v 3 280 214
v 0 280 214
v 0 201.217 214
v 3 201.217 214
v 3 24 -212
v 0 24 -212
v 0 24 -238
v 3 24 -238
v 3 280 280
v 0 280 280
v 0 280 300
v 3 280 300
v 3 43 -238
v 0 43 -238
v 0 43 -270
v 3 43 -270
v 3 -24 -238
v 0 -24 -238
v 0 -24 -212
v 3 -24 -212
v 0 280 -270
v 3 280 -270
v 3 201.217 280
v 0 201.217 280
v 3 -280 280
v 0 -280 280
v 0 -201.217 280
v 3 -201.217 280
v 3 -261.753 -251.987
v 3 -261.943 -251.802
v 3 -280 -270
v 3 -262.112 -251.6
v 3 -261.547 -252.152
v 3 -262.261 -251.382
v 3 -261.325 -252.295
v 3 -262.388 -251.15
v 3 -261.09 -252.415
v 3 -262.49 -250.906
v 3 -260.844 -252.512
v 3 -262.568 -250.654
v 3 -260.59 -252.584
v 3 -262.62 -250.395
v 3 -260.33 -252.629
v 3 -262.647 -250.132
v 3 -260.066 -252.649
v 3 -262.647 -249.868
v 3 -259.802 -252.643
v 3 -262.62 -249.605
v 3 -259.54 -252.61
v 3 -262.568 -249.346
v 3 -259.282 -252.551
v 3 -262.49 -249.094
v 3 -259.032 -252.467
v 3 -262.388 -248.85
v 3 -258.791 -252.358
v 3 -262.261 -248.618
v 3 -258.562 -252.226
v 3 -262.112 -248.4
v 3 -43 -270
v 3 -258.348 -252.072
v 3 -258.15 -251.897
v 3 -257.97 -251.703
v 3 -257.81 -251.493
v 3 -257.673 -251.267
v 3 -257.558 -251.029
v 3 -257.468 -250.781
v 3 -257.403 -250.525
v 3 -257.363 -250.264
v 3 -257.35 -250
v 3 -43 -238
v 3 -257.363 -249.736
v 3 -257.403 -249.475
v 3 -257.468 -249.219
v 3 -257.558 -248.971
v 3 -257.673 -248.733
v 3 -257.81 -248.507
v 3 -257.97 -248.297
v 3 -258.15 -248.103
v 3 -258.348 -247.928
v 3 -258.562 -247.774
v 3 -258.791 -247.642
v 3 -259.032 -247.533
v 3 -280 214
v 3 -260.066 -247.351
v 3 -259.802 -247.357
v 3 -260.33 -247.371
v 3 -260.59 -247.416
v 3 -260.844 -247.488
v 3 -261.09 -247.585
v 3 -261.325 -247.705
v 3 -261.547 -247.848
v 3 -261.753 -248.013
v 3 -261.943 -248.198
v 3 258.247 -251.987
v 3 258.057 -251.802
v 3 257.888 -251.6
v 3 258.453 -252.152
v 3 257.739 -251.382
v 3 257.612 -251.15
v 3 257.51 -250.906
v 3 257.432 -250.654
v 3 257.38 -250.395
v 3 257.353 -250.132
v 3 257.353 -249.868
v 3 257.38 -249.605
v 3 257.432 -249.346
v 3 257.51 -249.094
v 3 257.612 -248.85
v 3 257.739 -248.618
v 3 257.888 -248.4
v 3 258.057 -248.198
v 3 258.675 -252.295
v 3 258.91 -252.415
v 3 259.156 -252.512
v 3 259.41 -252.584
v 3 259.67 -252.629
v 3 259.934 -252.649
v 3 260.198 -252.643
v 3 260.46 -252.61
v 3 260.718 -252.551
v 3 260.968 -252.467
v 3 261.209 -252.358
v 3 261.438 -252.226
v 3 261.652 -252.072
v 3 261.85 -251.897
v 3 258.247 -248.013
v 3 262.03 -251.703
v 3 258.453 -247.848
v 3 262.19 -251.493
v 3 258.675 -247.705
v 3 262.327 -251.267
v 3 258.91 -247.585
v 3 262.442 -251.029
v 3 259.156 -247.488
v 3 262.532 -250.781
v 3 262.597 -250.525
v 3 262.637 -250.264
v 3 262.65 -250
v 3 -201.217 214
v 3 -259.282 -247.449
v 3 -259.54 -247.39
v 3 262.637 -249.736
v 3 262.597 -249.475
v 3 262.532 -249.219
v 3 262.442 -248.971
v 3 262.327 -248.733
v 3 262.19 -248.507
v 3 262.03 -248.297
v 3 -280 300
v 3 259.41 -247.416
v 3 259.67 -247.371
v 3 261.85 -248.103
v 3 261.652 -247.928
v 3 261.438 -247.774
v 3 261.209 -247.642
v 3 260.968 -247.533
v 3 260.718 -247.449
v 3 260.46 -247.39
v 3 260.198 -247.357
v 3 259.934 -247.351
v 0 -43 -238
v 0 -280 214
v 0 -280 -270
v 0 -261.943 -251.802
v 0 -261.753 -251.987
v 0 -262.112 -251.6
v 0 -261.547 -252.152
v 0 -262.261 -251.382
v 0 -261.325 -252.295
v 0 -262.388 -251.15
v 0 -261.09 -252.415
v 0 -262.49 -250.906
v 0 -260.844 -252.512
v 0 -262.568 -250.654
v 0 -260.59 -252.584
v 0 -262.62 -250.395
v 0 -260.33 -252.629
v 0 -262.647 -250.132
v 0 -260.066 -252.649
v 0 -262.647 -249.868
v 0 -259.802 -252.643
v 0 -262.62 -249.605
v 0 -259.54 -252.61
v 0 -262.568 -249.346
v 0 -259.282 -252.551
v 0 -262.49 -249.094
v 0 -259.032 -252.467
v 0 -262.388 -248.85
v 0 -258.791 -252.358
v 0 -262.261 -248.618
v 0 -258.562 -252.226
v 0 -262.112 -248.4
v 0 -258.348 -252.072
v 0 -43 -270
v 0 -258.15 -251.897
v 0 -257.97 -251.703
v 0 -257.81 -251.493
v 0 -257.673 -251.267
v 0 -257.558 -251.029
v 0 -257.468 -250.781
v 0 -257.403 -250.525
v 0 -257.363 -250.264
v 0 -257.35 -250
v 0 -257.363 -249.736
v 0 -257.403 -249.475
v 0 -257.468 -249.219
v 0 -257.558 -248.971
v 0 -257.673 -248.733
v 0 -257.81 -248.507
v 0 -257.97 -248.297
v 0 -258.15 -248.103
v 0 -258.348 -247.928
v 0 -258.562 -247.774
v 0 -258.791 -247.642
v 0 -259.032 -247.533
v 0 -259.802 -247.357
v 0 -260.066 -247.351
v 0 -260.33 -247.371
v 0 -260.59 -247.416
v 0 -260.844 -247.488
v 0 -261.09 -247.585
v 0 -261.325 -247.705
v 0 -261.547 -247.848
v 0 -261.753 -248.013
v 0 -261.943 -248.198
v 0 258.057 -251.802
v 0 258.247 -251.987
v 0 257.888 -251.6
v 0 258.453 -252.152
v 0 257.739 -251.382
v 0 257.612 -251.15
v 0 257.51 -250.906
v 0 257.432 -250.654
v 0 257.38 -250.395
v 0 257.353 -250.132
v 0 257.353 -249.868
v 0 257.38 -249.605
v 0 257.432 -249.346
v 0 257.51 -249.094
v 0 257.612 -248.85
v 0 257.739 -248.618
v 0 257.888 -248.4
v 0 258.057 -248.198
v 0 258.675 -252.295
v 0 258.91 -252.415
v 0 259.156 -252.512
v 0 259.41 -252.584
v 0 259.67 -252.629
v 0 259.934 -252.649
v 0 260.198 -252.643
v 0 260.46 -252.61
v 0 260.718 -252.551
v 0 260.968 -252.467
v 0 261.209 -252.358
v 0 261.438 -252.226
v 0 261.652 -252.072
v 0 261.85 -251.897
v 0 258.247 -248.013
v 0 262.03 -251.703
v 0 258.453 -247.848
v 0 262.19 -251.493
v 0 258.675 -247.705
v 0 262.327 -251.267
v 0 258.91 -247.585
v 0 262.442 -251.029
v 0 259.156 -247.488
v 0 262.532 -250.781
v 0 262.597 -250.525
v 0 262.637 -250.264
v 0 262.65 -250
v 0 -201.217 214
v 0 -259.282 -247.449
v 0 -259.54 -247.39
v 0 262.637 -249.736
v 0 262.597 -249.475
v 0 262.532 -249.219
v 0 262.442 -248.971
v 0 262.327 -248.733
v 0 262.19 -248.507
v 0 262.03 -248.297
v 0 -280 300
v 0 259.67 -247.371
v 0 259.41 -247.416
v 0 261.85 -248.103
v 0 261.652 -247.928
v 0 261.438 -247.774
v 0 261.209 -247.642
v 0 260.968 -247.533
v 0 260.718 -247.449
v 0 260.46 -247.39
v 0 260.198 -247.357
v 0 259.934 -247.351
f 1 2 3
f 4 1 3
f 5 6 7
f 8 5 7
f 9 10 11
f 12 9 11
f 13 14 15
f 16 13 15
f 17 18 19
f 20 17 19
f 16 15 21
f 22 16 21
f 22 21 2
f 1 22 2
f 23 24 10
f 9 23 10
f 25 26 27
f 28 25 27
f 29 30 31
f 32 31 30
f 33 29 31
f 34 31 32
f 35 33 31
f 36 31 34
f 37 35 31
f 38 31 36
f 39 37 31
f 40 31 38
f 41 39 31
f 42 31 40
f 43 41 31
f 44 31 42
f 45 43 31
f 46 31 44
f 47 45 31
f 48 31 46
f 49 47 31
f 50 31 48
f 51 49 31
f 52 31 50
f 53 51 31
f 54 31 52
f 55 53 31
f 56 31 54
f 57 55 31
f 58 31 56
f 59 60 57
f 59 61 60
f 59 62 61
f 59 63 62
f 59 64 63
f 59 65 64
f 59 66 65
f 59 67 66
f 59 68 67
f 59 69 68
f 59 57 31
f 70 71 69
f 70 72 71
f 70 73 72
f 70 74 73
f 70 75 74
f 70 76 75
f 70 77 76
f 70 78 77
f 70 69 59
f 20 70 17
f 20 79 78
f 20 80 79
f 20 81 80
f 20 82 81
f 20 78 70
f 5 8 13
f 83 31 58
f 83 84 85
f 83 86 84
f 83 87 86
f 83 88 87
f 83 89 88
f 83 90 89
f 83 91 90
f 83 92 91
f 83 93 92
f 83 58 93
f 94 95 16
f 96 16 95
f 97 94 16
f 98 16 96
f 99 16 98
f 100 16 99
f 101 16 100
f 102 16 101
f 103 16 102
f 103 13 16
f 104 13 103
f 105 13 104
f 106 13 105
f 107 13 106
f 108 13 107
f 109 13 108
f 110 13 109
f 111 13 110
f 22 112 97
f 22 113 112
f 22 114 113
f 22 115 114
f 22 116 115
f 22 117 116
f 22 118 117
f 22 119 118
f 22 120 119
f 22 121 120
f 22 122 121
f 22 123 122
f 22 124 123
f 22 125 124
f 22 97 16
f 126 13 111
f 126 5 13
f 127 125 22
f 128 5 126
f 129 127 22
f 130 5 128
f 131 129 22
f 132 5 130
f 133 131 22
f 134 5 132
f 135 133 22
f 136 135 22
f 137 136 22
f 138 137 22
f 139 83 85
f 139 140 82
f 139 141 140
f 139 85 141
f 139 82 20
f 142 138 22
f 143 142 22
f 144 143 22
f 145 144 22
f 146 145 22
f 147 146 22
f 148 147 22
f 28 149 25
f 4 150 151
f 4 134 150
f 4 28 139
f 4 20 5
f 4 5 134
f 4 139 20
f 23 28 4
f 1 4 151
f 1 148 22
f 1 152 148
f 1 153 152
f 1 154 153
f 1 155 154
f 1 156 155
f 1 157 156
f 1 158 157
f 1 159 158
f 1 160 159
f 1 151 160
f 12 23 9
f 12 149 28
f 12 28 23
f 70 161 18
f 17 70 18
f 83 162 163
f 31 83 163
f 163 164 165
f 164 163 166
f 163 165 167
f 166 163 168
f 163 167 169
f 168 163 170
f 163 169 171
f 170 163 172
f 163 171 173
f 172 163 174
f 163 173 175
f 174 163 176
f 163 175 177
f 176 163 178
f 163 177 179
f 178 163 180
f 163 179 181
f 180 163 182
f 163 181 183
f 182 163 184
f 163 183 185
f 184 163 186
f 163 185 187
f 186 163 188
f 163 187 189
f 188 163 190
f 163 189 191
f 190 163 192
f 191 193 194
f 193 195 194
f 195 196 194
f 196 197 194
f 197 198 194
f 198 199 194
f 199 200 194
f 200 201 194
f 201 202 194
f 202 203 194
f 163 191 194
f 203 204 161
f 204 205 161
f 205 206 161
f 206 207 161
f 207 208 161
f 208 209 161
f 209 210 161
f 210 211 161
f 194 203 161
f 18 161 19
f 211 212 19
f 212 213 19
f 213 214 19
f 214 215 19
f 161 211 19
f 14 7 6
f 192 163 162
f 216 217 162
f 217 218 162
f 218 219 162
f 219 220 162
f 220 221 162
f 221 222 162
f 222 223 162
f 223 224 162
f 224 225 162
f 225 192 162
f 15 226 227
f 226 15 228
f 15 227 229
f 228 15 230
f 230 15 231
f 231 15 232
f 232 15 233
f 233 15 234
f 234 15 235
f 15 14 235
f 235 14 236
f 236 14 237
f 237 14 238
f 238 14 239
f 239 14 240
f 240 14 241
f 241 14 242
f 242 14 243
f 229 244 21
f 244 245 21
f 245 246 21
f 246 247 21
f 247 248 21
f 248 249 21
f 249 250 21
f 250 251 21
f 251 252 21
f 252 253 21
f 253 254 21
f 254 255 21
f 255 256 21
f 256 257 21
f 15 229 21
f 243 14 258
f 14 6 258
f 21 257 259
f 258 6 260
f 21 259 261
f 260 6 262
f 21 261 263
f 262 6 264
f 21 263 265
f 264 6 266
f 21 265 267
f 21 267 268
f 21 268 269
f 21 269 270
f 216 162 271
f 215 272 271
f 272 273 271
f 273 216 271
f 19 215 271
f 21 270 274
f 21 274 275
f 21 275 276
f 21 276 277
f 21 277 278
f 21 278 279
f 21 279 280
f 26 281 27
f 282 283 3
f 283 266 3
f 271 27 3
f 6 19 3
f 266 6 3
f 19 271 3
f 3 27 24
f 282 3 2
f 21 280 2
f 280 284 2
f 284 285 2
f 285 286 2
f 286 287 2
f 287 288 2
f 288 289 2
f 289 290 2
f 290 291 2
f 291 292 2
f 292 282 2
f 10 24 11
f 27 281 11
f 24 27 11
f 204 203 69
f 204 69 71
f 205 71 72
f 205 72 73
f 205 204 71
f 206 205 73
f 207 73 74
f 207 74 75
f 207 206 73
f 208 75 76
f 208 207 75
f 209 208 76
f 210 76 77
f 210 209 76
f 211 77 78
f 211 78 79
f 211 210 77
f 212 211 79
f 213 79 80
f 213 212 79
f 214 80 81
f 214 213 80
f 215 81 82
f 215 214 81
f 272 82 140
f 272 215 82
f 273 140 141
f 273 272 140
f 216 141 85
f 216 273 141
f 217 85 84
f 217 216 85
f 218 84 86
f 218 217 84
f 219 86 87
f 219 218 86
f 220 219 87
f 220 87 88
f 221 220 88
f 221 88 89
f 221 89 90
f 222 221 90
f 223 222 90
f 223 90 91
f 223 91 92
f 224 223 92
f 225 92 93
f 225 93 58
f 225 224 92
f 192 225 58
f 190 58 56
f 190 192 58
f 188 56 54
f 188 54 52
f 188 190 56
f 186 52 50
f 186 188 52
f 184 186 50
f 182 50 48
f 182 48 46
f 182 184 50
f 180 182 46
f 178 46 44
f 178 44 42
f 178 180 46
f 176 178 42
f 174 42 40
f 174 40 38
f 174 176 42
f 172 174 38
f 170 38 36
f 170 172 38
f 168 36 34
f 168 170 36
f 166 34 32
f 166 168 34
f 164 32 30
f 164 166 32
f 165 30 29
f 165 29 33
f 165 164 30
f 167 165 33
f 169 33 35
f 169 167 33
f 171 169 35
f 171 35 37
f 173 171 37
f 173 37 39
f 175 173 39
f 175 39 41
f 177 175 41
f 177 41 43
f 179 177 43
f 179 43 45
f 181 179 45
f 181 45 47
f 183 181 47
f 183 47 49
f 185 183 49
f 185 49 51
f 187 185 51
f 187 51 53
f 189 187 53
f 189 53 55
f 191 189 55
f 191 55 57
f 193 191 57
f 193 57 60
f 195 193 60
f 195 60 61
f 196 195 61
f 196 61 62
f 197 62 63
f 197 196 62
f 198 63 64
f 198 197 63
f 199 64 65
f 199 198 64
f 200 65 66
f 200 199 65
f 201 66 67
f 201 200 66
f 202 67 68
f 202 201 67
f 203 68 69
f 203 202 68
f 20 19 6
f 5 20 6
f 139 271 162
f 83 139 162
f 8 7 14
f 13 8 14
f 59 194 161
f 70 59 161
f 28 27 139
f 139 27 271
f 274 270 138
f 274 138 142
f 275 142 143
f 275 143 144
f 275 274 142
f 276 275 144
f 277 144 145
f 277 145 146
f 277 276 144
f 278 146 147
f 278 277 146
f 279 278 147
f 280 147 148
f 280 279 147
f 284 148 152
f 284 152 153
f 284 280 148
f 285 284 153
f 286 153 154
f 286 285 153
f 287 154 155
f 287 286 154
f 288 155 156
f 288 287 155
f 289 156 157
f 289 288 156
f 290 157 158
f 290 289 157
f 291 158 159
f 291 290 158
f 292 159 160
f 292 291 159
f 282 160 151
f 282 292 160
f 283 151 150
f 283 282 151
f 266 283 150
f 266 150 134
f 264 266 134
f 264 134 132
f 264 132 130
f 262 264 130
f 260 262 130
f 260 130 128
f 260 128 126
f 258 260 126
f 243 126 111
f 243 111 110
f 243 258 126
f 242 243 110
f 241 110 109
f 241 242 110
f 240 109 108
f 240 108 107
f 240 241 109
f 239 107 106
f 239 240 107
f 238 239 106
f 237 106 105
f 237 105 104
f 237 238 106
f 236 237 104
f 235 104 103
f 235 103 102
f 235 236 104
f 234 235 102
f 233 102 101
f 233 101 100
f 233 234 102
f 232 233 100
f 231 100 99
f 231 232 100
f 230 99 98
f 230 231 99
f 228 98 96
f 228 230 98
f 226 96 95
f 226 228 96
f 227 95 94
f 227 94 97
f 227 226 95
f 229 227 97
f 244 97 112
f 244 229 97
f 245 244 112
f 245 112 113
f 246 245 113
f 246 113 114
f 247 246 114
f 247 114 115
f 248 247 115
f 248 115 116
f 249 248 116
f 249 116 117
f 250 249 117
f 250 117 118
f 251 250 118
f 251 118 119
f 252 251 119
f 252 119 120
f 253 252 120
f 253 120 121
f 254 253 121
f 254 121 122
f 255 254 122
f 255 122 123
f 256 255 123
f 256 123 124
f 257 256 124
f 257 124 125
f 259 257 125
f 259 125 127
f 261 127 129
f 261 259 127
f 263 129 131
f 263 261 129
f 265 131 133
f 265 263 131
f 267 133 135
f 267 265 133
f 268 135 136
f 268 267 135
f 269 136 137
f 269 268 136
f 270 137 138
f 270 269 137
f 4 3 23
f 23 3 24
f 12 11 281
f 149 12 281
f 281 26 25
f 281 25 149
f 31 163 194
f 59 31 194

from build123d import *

# Parameters (mm, degrees)
F0_R     = 2.65
F0_W     = 78.782992
F0_H     = 20
F1_DEPTH = 3


with BuildPart() as f1:
    # F0 (on Right) → F1 (new body)
    with BuildSketch(Plane.YZ):
        Polygon((280, -270), (280, -260), (280, 214), (201.217008, 214), (201.217008, 280), (201.217008, 300), (-201.217008, 300), (-201.217008, 280), (-201.217008, 214), (-280, 214), (-280, -270), (-43, -270), (-43, -238), (-24, -238), (-24, -212), (24, -212), (24, -238), (43, -238), (43, -270), align=None)
        with Locations((-260, -250)):
            Circle(F0_R, mode=Mode.SUBTRACT)
        with Locations((260, -250)):
            Circle(F0_R, mode=Mode.SUBTRACT)
        with Locations((240.608504, 290)):
            Rectangle(F0_W, F0_H)
        with Locations((-240.608504, 290)):
            Rectangle(F0_W, F0_H)
    extrude(amount=F1_DEPTH)


solid = f1.part
